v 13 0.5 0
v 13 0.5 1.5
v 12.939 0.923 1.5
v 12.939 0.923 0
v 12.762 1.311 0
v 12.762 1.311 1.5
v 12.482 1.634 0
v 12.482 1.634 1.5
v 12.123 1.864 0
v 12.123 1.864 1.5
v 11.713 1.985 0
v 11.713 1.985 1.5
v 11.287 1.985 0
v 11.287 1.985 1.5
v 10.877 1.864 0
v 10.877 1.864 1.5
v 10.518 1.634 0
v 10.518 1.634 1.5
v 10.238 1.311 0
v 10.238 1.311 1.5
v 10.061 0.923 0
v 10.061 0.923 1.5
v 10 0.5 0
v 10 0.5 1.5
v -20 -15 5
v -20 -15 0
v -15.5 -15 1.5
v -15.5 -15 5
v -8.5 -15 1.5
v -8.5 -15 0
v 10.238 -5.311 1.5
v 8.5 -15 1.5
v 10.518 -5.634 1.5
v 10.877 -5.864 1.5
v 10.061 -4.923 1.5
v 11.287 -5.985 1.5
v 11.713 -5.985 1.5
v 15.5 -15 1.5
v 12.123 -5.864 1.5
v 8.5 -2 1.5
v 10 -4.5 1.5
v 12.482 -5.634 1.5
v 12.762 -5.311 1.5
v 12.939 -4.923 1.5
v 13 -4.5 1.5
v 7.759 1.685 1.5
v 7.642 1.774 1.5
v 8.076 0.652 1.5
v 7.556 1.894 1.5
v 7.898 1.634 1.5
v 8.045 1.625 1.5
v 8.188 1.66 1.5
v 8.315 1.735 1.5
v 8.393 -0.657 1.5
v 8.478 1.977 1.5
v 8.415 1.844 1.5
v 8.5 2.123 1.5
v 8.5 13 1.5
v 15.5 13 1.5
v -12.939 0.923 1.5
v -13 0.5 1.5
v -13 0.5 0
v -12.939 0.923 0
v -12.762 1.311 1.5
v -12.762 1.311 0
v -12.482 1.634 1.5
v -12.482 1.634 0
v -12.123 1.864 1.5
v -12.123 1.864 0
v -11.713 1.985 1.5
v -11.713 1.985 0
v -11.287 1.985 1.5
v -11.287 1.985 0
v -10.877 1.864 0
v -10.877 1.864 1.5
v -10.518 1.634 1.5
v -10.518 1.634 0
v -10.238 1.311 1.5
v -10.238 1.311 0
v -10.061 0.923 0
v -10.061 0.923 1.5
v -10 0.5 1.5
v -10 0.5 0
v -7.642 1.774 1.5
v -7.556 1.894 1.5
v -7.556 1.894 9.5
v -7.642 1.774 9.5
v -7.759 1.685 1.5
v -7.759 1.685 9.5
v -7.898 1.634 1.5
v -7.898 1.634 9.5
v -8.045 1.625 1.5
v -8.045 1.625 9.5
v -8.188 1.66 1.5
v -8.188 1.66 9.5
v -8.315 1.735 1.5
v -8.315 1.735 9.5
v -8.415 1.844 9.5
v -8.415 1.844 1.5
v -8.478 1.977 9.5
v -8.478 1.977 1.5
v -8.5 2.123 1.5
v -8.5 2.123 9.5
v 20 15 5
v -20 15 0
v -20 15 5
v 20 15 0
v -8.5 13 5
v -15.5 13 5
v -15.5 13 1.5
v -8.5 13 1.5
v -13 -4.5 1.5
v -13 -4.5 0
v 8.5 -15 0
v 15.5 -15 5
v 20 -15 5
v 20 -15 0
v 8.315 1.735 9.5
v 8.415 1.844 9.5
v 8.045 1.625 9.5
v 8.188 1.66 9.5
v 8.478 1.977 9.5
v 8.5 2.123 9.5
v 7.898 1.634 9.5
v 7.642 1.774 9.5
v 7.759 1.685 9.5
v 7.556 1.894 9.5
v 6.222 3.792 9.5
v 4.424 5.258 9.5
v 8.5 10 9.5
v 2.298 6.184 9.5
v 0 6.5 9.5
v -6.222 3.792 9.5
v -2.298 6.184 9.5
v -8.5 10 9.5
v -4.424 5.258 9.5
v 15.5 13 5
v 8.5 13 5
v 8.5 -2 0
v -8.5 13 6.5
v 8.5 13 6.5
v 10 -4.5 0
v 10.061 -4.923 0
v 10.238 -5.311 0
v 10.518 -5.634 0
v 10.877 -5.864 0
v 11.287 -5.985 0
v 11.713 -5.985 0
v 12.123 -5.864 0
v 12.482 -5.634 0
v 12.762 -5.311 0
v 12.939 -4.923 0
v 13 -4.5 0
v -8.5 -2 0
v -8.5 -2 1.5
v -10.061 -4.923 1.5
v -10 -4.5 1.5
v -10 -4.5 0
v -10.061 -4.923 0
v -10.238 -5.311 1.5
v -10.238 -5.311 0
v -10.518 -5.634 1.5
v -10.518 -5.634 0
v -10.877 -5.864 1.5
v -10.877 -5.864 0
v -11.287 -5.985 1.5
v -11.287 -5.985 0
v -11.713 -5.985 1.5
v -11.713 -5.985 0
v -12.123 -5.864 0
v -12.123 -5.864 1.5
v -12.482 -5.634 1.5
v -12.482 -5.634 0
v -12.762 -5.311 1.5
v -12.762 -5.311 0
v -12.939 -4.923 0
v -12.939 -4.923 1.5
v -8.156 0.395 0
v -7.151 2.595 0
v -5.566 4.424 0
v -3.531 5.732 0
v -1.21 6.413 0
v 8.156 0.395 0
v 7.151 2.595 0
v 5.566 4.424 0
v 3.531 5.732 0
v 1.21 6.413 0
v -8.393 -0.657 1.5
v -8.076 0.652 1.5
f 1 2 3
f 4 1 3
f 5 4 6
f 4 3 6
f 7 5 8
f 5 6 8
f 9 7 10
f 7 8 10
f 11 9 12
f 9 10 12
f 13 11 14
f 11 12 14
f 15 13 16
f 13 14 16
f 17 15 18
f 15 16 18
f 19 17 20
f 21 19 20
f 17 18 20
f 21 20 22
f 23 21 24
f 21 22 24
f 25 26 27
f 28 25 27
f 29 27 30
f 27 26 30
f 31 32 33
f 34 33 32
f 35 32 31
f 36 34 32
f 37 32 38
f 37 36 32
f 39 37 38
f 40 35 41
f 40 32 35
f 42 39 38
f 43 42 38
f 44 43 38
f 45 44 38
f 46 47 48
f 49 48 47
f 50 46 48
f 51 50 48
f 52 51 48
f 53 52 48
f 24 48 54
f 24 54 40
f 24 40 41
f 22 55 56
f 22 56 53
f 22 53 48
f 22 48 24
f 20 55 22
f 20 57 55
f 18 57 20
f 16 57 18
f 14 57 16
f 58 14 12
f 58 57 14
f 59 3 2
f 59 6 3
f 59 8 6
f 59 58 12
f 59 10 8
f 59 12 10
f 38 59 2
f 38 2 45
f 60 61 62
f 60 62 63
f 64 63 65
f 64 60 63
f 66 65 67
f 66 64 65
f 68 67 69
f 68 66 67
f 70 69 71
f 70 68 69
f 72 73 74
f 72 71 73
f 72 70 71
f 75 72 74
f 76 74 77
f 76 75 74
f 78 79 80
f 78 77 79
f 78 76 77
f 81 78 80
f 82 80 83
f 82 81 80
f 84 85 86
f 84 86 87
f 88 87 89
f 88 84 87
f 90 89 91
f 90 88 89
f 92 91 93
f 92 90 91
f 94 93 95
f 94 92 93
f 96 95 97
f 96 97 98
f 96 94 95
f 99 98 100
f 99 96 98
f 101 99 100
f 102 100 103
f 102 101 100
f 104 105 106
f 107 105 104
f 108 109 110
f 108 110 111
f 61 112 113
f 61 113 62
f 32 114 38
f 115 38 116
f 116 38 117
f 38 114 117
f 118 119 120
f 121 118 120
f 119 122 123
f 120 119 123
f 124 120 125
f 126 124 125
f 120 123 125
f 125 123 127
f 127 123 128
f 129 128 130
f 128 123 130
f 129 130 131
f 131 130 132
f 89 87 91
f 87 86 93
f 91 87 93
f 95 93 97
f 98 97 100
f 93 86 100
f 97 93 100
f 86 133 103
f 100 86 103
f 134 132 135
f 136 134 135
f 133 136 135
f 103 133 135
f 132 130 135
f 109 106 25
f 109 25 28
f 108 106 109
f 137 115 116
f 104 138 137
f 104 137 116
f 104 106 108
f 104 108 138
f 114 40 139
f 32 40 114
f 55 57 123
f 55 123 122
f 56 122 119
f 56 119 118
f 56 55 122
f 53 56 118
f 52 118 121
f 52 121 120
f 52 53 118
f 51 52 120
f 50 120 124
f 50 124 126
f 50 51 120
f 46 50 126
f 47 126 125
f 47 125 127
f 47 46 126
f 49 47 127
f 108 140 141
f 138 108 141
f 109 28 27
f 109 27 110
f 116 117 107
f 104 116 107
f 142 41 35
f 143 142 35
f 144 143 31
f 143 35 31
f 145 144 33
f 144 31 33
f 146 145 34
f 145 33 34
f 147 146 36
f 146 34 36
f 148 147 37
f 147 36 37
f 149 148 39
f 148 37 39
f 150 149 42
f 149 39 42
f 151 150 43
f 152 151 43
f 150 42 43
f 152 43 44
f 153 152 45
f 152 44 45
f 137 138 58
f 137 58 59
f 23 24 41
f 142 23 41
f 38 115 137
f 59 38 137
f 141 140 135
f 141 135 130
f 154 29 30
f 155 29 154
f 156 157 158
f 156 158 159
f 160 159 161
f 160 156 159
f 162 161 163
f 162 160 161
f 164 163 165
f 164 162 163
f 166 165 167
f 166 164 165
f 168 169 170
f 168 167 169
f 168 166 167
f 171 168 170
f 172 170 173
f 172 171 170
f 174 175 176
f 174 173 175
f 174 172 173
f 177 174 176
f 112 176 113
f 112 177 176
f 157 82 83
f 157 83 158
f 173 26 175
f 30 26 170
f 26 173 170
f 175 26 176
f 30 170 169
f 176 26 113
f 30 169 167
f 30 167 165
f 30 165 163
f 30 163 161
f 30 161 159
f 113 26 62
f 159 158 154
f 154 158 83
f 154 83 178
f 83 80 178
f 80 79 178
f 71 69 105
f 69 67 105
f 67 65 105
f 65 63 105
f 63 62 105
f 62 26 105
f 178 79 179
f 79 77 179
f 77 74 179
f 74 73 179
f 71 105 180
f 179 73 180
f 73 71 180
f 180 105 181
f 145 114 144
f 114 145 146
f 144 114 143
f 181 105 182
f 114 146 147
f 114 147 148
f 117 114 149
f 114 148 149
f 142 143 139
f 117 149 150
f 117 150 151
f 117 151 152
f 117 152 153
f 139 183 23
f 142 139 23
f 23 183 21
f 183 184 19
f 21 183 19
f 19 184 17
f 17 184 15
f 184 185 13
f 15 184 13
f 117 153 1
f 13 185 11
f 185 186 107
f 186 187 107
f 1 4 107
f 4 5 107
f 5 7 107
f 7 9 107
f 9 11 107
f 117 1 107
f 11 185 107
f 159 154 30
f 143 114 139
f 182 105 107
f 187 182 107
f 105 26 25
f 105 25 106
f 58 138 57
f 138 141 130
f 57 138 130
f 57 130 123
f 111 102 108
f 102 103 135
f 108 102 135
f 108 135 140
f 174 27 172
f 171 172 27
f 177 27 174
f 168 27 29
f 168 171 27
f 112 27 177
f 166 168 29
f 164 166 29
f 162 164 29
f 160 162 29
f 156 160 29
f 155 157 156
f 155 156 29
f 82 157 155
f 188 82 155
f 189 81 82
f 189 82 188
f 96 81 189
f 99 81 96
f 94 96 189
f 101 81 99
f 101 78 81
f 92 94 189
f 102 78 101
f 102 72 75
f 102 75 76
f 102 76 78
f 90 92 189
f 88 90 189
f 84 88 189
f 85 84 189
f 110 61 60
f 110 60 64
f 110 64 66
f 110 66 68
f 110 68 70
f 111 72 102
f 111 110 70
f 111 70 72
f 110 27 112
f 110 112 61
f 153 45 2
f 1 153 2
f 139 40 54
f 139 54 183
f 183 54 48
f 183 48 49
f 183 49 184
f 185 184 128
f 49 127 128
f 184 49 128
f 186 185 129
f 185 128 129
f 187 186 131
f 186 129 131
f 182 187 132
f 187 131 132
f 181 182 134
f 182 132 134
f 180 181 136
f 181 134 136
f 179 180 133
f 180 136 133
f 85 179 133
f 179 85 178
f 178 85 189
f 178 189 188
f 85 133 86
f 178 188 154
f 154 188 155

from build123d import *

# Parameters (mm, degrees)
SKETCH_1_W          = 40
SKETCH_1_H          = 30
EXTRUDE_1_DEPTH     = 5
SKETCH_2_W          = 31
SKETCH_2_H          = 28
CUT_EXTRUDE_1_DEPTH = 3.5
CUT_EXTRUDE_2_DEPTH = 26.243811123
EXTRUDE_START       = 8
EXTRUDE_2_DEPTH     = 8
FILLET_START        = 1.5
FILLET_1_DEPTH      = 8.5
CHAMFER_1_SIZE      = 3


with BuildPart() as part:
    # ｽｹｯﾁ1 → ﾎﾞｽ - 押し出し1 (new body)
    with BuildSketch(Plane.XY):
        Rectangle(SKETCH_1_W, SKETCH_1_H)
    extrude(amount=EXTRUDE_1_DEPTH)

    # ｽｹｯﾁ2 → ｶｯﾄ - 押し出し1 (cut)
    with BuildSketch(Plane.XY.offset(5)):
        with Locations((0, -1)):
            Rectangle(SKETCH_2_W, SKETCH_2_H)
    extrude(amount=-CUT_EXTRUDE_1_DEPTH, mode=Mode.SUBTRACT)

    # ｽｹｯﾁ3 → ｶｯﾄ - 押し出し2 (cut, through all)
    with BuildSketch(Plane.XY.offset(1.5)):
        with BuildLine():
            Line((8.5, -2), (8.5, -15))
            Line((8.5, -15), (-8.5, -15))
            Line((-8.5, -15), (-8.5, -2))
            ThreePointArc((-8.5, -2), (0, 6.5), (8.5, -2))
        make_face()
        with BuildLine():
            Line((13, -4.5), (13, 0.5))
            ThreePointArc((13, 0.5), (11.5, 2), (10, 0.5))
            Line((10, 0.5), (10, -4.5))
            ThreePointArc((10, -4.5), (11.5, -6), (13, -4.5))
        make_face()
        with BuildLine():
            Line((-13, -4.5), (-13, 0.5))
            ThreePointArc((-13, 0.5), (-11.5, 2), (-10, 0.5))
            Line((-10, 0.5), (-10, -4.5))
            ThreePointArc((-10, -4.5), (-11.5, -6), (-13, -4.5))
        make_face()
    extrude(amount=-CUT_EXTRUDE_2_DEPTH, mode=Mode.SUBTRACT)

    # ｽｹｯﾁ4 → ﾎﾞｽ - 押し出し2 (add)
    with BuildSketch(Plane.XY.offset(1.5).offset(EXTRUDE_START)):
        with BuildLine():
            Line((-8.5, -2), (-8.5, 13))
            Line((-8.5, 13), (8.5, 13))
            Line((8.5, 13), (8.5, -2))
            ThreePointArc((8.5, -2), (0, 6.5), (-8.5, -2))
        make_face()
    extrude(amount=-EXTRUDE_2_DEPTH)

    # ﾌｨﾚｯﾄ1: read off the stored shape, not the designer's step
    # ﾌｨﾚｯﾄ1 outline → ﾌｨﾚｯﾄ1 (cut)
    with BuildSketch(Plane.XY.offset(FILLET_START)):
        with BuildLine():
            ThreePointArc((8.5, 2.123105626), (8.117851131, 1.637192968), (7.555555556, 1.894044202))
            ThreePointArc((7.555555556, 1.894044202), (8.260515184, 0.003469213), (8.5, -2))
            Line((8.5, -2), (8.5, 2.123105626))
        make_face()
        with BuildLine():
            ThreePointArc((-7.555555556, 1.894044202), (-8.117851131, 1.637192968), (-8.5, 2.123105626))
            Line((-8.5, 2.123105626), (-8.5, -2))
            ThreePointArc((-8.5, -2), (-8.260515184, 0.003469213), (-7.555555556, 1.894044202))
        make_face()
    extrude(amount=FILLET_1_DEPTH, mode=Mode.SUBTRACT)

    # 面取り1
    chamfer_1_edges = [part.edges().sort_by_distance(p)[0] for p in [
        (0, 13, 9.5),
    ]]
    chamfer(chamfer_1_edges, length=CHAMFER_1_SIZE)


solid = part.part
